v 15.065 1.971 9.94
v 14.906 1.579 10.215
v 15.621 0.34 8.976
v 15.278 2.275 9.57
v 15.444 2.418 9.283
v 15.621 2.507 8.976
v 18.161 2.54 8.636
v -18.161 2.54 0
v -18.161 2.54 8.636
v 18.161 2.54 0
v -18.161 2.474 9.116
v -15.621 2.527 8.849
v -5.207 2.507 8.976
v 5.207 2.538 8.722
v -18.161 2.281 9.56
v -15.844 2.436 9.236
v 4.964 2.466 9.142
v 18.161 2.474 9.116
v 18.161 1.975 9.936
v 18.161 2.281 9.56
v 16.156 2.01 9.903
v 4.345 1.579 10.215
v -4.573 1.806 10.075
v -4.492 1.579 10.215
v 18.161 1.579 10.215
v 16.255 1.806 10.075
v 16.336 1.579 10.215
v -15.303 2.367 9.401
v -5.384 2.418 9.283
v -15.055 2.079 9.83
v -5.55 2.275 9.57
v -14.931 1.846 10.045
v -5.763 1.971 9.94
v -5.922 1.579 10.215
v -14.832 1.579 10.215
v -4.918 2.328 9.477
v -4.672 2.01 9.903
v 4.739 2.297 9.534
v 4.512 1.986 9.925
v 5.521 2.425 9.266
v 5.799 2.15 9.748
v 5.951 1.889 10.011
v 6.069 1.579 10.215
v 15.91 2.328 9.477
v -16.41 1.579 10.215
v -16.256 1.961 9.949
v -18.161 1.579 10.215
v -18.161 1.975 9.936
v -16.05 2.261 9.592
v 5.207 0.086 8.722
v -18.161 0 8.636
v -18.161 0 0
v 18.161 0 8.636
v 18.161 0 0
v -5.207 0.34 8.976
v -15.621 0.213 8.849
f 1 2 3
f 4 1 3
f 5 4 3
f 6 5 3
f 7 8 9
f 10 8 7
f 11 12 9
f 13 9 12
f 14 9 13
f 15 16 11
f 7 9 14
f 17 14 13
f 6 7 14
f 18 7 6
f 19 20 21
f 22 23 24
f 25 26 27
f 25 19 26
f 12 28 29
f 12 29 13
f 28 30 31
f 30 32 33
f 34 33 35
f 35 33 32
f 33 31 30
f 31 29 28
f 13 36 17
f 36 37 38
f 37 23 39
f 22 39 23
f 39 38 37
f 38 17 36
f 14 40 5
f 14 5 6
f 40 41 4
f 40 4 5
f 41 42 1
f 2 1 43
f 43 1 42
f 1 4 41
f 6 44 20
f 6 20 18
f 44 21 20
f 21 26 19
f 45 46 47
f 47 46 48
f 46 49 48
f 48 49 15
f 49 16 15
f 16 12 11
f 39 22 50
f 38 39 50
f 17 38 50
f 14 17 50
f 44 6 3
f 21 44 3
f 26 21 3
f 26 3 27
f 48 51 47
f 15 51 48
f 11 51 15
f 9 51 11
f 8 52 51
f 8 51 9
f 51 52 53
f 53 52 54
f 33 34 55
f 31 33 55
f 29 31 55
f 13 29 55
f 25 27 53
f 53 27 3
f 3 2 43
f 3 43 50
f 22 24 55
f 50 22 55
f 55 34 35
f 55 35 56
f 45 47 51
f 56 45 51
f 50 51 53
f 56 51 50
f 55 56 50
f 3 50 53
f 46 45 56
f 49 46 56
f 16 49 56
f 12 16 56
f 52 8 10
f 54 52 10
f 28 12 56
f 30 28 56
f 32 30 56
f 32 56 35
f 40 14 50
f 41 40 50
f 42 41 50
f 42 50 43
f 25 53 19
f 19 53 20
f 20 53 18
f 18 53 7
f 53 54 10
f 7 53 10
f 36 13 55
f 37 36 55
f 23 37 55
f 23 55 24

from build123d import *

# Parameters (mm, degrees)
F0_W        = 36.322
F0_H        = 2.54
F1_DEPTH    = 10.414
F3_R        = 1.778
F4_T1_DEPTH = 45.4669047052
F5_DEPTH    = 25.4


# Not quite as in the source:
# - a fillet or chamfer that OpenCascade refuses, or shapes differently, is made with other operations: its cross-section is extruded or revolved along the edge and cut away or added


with BuildPart() as f1:
    # F0 (on Top) → F1 (new body)
    with BuildSketch(Plane.XY):
        with Locations((0, 1.27)):
            Rectangle(F0_W, F0_H)
    extrude(amount=F1_DEPTH)

    # F3
    f3_edges = [f1.edges().sort_by_distance(p)[0] for p in [
        (0, 2.54, 10.414),
    ]]
    fillet(f3_edges, radius=F3_R)

    # F4: chamfer of 1.778 on 1 edges, made by hand

    # F4_s2 → F4_t1 (cut)
    with BuildSketch(Plane.YZ.offset(-22.7334523526)):
        Polygon((1.778, 10.414), (0, 8.636), (0, 10.414), align=None)
    extrude(amount=F4_T1_DEPTH, mode=Mode.SUBTRACT)

    # F2 (on face) → F5 (cut)
    with BuildSketch(Plane.XZ):
        Polygon((-15.621, 8.8492954744), (-14.7176174209, 10.414), (-16.5243825791, 10.414), align=None)
        Polygon((-4.3769409051, 10.414), (-6.0370590949, 10.414), (-5.207, 8.9762954744), align=None)
        Polygon((6.1837060633, 10.414), (4.2302939367, 10.414), (5.207, 8.7222954744), align=None)
        Polygon((16.4510590949, 10.414), (14.7909409051, 10.414), (15.621, 8.9762954744), align=None)
    extrude(amount=-F5_DEPTH, mode=Mode.SUBTRACT)


solid = f1.part
